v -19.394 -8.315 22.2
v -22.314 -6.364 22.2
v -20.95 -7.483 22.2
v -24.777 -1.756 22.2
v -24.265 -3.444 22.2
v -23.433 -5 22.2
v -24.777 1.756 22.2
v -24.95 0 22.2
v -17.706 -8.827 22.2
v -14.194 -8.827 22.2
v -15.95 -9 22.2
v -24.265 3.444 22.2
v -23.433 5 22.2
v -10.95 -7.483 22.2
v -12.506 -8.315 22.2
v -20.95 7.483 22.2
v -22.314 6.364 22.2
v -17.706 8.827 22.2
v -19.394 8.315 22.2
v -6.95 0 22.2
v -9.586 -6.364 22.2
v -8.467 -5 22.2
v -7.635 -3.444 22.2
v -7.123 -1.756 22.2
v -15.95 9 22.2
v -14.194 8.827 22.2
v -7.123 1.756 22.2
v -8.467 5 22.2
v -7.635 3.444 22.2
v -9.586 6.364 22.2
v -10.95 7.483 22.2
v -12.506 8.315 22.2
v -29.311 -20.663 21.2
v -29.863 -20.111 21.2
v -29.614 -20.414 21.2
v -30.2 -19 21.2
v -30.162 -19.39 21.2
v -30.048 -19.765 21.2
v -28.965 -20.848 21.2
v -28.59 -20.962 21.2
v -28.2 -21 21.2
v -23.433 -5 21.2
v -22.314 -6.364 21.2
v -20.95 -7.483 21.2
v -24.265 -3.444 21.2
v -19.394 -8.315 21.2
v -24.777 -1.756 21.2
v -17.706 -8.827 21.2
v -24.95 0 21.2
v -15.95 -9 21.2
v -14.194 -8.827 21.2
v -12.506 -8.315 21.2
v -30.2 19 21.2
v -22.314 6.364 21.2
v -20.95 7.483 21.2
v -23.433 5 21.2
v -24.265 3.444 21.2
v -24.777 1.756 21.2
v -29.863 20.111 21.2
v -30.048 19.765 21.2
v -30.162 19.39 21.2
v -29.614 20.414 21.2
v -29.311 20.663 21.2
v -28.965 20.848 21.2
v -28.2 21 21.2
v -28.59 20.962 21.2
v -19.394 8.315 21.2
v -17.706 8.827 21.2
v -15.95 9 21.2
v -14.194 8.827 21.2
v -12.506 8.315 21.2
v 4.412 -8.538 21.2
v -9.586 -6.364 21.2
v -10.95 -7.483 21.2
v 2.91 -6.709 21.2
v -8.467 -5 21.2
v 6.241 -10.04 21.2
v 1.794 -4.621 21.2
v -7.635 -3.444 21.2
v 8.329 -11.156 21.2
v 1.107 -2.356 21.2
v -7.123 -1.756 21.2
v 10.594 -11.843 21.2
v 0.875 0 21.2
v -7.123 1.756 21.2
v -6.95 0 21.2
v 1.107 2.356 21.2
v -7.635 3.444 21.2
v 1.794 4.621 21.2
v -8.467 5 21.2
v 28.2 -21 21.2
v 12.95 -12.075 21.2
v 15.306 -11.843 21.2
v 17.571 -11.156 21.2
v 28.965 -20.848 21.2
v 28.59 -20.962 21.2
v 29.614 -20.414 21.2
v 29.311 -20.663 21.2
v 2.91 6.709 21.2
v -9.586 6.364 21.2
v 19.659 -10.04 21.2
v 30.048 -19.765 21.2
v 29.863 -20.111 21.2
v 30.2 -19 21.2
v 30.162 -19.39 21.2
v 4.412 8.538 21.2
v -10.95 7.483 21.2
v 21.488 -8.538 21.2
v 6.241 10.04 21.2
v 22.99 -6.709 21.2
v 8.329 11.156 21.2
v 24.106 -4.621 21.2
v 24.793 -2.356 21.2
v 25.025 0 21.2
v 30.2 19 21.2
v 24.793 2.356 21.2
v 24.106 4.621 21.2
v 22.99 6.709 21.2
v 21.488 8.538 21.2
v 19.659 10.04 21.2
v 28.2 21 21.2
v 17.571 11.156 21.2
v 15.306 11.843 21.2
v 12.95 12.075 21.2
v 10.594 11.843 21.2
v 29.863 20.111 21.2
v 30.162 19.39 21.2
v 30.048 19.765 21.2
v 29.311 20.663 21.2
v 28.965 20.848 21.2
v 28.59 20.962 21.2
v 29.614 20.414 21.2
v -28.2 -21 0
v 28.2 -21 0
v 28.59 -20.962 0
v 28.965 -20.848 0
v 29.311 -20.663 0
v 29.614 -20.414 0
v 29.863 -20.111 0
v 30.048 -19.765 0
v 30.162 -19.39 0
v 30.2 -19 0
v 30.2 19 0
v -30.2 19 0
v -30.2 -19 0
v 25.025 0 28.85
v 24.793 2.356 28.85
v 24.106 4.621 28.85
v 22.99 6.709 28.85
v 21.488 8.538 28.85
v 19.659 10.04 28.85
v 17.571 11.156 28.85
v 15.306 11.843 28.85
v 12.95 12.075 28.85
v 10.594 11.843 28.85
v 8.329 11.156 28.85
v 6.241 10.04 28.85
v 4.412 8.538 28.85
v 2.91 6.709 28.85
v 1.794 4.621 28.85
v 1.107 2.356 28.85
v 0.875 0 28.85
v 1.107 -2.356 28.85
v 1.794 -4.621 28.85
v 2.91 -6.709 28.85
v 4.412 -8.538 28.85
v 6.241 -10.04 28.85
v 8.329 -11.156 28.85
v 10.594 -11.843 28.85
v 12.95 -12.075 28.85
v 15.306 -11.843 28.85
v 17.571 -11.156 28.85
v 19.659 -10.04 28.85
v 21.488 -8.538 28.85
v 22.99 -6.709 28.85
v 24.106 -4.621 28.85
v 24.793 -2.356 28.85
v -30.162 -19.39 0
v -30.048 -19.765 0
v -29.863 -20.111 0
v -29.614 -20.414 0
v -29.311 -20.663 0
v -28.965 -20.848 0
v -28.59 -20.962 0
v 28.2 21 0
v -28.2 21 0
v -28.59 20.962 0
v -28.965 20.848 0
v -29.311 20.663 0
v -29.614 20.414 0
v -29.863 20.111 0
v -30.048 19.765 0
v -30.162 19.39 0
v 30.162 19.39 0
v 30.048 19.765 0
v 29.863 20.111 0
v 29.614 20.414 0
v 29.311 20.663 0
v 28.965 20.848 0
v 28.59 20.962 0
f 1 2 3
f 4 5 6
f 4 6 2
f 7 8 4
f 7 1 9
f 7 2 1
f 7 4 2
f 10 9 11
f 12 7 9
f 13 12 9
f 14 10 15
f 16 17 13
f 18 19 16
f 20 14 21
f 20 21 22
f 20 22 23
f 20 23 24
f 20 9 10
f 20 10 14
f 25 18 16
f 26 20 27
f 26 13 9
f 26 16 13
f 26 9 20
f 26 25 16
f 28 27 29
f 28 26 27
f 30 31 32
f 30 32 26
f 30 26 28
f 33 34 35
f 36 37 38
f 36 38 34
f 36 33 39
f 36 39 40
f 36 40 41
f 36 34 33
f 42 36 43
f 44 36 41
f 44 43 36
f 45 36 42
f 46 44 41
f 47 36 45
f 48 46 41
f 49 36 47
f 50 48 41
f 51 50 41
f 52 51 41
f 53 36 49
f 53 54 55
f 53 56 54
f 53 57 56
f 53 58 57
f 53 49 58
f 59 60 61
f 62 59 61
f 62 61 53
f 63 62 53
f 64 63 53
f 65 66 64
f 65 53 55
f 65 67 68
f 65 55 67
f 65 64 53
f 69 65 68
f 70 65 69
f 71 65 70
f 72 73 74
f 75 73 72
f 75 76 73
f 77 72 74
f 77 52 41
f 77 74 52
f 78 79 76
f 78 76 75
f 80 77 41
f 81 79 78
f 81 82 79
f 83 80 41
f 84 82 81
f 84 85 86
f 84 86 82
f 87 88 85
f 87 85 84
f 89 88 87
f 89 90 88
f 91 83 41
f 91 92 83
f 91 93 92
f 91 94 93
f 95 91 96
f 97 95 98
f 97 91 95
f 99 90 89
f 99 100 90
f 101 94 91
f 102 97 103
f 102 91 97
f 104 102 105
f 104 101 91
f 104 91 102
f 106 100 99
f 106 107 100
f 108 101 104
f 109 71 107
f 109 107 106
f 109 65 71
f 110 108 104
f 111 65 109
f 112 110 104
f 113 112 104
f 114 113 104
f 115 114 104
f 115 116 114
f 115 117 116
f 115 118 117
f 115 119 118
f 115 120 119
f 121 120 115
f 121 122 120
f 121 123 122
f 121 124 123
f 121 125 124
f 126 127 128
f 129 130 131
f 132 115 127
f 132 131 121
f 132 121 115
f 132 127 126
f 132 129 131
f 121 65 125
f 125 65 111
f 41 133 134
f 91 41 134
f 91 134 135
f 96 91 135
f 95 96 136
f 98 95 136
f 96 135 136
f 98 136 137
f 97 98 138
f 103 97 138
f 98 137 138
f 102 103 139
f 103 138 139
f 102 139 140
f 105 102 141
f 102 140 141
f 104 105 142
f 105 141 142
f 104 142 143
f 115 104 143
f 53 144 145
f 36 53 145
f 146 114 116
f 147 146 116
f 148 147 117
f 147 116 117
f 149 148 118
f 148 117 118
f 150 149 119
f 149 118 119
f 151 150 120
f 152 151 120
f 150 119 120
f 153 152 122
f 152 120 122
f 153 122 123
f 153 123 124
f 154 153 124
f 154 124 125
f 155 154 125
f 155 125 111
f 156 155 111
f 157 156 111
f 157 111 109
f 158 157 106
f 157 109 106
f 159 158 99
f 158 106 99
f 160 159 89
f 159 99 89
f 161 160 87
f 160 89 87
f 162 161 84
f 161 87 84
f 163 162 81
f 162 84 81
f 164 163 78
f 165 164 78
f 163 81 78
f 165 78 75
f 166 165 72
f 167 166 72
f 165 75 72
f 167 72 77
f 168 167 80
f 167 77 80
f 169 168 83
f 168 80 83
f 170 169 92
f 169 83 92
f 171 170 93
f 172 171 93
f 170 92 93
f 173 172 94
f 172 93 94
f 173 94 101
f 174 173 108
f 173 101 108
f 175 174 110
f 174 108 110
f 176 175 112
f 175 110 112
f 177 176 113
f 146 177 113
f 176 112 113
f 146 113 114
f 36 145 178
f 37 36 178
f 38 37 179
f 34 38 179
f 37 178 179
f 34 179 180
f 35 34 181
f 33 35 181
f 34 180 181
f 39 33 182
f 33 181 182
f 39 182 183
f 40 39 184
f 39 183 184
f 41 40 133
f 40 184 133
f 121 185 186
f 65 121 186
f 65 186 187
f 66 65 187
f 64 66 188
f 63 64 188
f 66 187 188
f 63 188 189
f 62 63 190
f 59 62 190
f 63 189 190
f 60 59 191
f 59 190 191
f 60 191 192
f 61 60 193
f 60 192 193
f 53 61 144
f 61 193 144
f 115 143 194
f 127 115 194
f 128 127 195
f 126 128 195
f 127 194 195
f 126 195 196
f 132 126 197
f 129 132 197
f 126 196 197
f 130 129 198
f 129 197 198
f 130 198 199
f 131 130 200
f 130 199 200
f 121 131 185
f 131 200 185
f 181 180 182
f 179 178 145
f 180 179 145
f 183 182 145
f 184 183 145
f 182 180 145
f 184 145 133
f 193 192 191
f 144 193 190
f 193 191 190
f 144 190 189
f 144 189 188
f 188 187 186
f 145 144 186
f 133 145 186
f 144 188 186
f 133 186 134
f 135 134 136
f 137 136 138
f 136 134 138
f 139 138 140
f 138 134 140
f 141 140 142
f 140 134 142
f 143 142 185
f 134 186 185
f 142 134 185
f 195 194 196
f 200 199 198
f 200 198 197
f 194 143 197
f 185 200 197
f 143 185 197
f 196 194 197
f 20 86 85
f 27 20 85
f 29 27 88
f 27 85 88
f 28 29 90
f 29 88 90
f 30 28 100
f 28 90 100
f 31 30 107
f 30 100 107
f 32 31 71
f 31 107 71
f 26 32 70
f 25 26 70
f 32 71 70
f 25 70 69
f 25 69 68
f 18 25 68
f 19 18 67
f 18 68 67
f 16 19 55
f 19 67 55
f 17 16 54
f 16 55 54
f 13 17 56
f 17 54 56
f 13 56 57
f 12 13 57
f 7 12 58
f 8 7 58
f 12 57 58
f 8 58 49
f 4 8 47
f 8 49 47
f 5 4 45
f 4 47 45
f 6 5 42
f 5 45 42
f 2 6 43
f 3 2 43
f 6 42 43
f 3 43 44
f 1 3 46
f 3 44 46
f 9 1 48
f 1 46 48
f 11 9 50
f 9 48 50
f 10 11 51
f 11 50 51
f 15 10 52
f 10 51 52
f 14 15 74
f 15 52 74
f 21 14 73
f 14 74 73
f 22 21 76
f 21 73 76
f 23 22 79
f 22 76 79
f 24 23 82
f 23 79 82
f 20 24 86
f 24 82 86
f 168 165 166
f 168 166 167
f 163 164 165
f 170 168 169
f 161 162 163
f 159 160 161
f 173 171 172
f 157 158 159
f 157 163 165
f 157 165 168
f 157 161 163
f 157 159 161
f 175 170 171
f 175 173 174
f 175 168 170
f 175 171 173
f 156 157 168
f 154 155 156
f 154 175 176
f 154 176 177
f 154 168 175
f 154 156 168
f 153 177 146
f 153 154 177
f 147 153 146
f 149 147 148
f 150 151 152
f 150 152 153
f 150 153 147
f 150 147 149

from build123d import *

# Parameters (mm, degrees)
F1_DEPTH = 21.2
F2_R     = 9
F3_DEPTH = 1
F4_R     = 12.075
F5_DEPTH = 7.65


with BuildPart() as f1:
    # F0 (on Top) → F1 (new body)
    with BuildSketch(Plane.XY):
        with BuildLine():
            ThreePointArc((-30.2, -19), (-29.6142135624, -20.4142135624), (-28.2, -21))
            Line((-28.2, -21), (28.2, -21))
            ThreePointArc((28.2, -21), (29.6142135624, -20.4142135624), (30.2, -19))
            Line((30.2, -19), (30.2, 19))
            ThreePointArc((30.2, 19), (29.6142135624, 20.4142135624), (28.2, 21))
            Line((28.2, 21), (-28.2, 21))
            ThreePointArc((-28.2, 21), (-29.6142135624, 20.4142135624), (-30.2, 19))
            Line((-30.2, 19), (-30.2, -19))
        make_face()
    extrude(amount=F1_DEPTH)

    # F2 (on face) → F3 (join)
    with BuildSketch(Plane.XY.offset(21.2)):
        with Locations((-15.95, 0)):
            Circle(F2_R)
    extrude(amount=F3_DEPTH)

    # F4 (on face) → F5 (join)
    with BuildSketch(Plane.XY.offset(21.2)):
        with Locations((12.95, 0)):
            Circle(F4_R)
    extrude(amount=F5_DEPTH)


solid = f1.part
